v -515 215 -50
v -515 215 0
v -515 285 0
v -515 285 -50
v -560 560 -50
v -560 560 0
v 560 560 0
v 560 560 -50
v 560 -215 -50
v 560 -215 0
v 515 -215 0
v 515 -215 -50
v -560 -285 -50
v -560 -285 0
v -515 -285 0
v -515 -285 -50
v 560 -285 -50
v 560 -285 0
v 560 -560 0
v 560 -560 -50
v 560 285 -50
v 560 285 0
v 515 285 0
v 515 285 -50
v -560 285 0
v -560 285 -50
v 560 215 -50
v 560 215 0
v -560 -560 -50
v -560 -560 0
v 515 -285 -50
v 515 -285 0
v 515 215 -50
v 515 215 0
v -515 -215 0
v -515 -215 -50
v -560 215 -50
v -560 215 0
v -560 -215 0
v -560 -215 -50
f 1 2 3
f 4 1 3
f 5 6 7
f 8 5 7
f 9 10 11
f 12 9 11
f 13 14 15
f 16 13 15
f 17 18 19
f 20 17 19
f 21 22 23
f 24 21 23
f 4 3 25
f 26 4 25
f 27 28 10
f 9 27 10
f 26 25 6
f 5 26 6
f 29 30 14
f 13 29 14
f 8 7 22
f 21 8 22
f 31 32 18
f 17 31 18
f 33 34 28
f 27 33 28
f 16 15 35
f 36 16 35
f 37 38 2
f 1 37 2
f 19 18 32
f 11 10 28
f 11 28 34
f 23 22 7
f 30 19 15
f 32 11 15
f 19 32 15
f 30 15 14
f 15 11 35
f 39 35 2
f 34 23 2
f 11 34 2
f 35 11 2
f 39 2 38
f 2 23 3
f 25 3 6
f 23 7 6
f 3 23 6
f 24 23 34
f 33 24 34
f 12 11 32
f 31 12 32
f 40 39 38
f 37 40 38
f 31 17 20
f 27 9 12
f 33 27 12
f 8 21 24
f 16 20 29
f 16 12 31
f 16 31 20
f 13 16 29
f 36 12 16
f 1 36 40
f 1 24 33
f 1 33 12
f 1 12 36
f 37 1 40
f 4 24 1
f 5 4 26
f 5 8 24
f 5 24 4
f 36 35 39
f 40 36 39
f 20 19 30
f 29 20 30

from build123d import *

# Parameters (mm, degrees)
BOSS_EXTRU_1_DEPTH = 50


with BuildPart() as part:
    # Esquisse1 → Boss.-Extru.1 (new body)
    with BuildSketch(Plane.XY):
        Polygon((560, -560), (-560, -560), (-560, -285), (-515, -285), (-515, -215), (-560, -215), (-560, 215), (-515, 215), (-515, 285), (-560, 285), (-560, 560), (560, 560), (560, 285), (515, 285), (515, 215), (560, 215), (560, -215), (515, -215), (515, -285), (560, -285), align=None)
    extrude(amount=-BOSS_EXTRU_1_DEPTH)


solid = part.part
